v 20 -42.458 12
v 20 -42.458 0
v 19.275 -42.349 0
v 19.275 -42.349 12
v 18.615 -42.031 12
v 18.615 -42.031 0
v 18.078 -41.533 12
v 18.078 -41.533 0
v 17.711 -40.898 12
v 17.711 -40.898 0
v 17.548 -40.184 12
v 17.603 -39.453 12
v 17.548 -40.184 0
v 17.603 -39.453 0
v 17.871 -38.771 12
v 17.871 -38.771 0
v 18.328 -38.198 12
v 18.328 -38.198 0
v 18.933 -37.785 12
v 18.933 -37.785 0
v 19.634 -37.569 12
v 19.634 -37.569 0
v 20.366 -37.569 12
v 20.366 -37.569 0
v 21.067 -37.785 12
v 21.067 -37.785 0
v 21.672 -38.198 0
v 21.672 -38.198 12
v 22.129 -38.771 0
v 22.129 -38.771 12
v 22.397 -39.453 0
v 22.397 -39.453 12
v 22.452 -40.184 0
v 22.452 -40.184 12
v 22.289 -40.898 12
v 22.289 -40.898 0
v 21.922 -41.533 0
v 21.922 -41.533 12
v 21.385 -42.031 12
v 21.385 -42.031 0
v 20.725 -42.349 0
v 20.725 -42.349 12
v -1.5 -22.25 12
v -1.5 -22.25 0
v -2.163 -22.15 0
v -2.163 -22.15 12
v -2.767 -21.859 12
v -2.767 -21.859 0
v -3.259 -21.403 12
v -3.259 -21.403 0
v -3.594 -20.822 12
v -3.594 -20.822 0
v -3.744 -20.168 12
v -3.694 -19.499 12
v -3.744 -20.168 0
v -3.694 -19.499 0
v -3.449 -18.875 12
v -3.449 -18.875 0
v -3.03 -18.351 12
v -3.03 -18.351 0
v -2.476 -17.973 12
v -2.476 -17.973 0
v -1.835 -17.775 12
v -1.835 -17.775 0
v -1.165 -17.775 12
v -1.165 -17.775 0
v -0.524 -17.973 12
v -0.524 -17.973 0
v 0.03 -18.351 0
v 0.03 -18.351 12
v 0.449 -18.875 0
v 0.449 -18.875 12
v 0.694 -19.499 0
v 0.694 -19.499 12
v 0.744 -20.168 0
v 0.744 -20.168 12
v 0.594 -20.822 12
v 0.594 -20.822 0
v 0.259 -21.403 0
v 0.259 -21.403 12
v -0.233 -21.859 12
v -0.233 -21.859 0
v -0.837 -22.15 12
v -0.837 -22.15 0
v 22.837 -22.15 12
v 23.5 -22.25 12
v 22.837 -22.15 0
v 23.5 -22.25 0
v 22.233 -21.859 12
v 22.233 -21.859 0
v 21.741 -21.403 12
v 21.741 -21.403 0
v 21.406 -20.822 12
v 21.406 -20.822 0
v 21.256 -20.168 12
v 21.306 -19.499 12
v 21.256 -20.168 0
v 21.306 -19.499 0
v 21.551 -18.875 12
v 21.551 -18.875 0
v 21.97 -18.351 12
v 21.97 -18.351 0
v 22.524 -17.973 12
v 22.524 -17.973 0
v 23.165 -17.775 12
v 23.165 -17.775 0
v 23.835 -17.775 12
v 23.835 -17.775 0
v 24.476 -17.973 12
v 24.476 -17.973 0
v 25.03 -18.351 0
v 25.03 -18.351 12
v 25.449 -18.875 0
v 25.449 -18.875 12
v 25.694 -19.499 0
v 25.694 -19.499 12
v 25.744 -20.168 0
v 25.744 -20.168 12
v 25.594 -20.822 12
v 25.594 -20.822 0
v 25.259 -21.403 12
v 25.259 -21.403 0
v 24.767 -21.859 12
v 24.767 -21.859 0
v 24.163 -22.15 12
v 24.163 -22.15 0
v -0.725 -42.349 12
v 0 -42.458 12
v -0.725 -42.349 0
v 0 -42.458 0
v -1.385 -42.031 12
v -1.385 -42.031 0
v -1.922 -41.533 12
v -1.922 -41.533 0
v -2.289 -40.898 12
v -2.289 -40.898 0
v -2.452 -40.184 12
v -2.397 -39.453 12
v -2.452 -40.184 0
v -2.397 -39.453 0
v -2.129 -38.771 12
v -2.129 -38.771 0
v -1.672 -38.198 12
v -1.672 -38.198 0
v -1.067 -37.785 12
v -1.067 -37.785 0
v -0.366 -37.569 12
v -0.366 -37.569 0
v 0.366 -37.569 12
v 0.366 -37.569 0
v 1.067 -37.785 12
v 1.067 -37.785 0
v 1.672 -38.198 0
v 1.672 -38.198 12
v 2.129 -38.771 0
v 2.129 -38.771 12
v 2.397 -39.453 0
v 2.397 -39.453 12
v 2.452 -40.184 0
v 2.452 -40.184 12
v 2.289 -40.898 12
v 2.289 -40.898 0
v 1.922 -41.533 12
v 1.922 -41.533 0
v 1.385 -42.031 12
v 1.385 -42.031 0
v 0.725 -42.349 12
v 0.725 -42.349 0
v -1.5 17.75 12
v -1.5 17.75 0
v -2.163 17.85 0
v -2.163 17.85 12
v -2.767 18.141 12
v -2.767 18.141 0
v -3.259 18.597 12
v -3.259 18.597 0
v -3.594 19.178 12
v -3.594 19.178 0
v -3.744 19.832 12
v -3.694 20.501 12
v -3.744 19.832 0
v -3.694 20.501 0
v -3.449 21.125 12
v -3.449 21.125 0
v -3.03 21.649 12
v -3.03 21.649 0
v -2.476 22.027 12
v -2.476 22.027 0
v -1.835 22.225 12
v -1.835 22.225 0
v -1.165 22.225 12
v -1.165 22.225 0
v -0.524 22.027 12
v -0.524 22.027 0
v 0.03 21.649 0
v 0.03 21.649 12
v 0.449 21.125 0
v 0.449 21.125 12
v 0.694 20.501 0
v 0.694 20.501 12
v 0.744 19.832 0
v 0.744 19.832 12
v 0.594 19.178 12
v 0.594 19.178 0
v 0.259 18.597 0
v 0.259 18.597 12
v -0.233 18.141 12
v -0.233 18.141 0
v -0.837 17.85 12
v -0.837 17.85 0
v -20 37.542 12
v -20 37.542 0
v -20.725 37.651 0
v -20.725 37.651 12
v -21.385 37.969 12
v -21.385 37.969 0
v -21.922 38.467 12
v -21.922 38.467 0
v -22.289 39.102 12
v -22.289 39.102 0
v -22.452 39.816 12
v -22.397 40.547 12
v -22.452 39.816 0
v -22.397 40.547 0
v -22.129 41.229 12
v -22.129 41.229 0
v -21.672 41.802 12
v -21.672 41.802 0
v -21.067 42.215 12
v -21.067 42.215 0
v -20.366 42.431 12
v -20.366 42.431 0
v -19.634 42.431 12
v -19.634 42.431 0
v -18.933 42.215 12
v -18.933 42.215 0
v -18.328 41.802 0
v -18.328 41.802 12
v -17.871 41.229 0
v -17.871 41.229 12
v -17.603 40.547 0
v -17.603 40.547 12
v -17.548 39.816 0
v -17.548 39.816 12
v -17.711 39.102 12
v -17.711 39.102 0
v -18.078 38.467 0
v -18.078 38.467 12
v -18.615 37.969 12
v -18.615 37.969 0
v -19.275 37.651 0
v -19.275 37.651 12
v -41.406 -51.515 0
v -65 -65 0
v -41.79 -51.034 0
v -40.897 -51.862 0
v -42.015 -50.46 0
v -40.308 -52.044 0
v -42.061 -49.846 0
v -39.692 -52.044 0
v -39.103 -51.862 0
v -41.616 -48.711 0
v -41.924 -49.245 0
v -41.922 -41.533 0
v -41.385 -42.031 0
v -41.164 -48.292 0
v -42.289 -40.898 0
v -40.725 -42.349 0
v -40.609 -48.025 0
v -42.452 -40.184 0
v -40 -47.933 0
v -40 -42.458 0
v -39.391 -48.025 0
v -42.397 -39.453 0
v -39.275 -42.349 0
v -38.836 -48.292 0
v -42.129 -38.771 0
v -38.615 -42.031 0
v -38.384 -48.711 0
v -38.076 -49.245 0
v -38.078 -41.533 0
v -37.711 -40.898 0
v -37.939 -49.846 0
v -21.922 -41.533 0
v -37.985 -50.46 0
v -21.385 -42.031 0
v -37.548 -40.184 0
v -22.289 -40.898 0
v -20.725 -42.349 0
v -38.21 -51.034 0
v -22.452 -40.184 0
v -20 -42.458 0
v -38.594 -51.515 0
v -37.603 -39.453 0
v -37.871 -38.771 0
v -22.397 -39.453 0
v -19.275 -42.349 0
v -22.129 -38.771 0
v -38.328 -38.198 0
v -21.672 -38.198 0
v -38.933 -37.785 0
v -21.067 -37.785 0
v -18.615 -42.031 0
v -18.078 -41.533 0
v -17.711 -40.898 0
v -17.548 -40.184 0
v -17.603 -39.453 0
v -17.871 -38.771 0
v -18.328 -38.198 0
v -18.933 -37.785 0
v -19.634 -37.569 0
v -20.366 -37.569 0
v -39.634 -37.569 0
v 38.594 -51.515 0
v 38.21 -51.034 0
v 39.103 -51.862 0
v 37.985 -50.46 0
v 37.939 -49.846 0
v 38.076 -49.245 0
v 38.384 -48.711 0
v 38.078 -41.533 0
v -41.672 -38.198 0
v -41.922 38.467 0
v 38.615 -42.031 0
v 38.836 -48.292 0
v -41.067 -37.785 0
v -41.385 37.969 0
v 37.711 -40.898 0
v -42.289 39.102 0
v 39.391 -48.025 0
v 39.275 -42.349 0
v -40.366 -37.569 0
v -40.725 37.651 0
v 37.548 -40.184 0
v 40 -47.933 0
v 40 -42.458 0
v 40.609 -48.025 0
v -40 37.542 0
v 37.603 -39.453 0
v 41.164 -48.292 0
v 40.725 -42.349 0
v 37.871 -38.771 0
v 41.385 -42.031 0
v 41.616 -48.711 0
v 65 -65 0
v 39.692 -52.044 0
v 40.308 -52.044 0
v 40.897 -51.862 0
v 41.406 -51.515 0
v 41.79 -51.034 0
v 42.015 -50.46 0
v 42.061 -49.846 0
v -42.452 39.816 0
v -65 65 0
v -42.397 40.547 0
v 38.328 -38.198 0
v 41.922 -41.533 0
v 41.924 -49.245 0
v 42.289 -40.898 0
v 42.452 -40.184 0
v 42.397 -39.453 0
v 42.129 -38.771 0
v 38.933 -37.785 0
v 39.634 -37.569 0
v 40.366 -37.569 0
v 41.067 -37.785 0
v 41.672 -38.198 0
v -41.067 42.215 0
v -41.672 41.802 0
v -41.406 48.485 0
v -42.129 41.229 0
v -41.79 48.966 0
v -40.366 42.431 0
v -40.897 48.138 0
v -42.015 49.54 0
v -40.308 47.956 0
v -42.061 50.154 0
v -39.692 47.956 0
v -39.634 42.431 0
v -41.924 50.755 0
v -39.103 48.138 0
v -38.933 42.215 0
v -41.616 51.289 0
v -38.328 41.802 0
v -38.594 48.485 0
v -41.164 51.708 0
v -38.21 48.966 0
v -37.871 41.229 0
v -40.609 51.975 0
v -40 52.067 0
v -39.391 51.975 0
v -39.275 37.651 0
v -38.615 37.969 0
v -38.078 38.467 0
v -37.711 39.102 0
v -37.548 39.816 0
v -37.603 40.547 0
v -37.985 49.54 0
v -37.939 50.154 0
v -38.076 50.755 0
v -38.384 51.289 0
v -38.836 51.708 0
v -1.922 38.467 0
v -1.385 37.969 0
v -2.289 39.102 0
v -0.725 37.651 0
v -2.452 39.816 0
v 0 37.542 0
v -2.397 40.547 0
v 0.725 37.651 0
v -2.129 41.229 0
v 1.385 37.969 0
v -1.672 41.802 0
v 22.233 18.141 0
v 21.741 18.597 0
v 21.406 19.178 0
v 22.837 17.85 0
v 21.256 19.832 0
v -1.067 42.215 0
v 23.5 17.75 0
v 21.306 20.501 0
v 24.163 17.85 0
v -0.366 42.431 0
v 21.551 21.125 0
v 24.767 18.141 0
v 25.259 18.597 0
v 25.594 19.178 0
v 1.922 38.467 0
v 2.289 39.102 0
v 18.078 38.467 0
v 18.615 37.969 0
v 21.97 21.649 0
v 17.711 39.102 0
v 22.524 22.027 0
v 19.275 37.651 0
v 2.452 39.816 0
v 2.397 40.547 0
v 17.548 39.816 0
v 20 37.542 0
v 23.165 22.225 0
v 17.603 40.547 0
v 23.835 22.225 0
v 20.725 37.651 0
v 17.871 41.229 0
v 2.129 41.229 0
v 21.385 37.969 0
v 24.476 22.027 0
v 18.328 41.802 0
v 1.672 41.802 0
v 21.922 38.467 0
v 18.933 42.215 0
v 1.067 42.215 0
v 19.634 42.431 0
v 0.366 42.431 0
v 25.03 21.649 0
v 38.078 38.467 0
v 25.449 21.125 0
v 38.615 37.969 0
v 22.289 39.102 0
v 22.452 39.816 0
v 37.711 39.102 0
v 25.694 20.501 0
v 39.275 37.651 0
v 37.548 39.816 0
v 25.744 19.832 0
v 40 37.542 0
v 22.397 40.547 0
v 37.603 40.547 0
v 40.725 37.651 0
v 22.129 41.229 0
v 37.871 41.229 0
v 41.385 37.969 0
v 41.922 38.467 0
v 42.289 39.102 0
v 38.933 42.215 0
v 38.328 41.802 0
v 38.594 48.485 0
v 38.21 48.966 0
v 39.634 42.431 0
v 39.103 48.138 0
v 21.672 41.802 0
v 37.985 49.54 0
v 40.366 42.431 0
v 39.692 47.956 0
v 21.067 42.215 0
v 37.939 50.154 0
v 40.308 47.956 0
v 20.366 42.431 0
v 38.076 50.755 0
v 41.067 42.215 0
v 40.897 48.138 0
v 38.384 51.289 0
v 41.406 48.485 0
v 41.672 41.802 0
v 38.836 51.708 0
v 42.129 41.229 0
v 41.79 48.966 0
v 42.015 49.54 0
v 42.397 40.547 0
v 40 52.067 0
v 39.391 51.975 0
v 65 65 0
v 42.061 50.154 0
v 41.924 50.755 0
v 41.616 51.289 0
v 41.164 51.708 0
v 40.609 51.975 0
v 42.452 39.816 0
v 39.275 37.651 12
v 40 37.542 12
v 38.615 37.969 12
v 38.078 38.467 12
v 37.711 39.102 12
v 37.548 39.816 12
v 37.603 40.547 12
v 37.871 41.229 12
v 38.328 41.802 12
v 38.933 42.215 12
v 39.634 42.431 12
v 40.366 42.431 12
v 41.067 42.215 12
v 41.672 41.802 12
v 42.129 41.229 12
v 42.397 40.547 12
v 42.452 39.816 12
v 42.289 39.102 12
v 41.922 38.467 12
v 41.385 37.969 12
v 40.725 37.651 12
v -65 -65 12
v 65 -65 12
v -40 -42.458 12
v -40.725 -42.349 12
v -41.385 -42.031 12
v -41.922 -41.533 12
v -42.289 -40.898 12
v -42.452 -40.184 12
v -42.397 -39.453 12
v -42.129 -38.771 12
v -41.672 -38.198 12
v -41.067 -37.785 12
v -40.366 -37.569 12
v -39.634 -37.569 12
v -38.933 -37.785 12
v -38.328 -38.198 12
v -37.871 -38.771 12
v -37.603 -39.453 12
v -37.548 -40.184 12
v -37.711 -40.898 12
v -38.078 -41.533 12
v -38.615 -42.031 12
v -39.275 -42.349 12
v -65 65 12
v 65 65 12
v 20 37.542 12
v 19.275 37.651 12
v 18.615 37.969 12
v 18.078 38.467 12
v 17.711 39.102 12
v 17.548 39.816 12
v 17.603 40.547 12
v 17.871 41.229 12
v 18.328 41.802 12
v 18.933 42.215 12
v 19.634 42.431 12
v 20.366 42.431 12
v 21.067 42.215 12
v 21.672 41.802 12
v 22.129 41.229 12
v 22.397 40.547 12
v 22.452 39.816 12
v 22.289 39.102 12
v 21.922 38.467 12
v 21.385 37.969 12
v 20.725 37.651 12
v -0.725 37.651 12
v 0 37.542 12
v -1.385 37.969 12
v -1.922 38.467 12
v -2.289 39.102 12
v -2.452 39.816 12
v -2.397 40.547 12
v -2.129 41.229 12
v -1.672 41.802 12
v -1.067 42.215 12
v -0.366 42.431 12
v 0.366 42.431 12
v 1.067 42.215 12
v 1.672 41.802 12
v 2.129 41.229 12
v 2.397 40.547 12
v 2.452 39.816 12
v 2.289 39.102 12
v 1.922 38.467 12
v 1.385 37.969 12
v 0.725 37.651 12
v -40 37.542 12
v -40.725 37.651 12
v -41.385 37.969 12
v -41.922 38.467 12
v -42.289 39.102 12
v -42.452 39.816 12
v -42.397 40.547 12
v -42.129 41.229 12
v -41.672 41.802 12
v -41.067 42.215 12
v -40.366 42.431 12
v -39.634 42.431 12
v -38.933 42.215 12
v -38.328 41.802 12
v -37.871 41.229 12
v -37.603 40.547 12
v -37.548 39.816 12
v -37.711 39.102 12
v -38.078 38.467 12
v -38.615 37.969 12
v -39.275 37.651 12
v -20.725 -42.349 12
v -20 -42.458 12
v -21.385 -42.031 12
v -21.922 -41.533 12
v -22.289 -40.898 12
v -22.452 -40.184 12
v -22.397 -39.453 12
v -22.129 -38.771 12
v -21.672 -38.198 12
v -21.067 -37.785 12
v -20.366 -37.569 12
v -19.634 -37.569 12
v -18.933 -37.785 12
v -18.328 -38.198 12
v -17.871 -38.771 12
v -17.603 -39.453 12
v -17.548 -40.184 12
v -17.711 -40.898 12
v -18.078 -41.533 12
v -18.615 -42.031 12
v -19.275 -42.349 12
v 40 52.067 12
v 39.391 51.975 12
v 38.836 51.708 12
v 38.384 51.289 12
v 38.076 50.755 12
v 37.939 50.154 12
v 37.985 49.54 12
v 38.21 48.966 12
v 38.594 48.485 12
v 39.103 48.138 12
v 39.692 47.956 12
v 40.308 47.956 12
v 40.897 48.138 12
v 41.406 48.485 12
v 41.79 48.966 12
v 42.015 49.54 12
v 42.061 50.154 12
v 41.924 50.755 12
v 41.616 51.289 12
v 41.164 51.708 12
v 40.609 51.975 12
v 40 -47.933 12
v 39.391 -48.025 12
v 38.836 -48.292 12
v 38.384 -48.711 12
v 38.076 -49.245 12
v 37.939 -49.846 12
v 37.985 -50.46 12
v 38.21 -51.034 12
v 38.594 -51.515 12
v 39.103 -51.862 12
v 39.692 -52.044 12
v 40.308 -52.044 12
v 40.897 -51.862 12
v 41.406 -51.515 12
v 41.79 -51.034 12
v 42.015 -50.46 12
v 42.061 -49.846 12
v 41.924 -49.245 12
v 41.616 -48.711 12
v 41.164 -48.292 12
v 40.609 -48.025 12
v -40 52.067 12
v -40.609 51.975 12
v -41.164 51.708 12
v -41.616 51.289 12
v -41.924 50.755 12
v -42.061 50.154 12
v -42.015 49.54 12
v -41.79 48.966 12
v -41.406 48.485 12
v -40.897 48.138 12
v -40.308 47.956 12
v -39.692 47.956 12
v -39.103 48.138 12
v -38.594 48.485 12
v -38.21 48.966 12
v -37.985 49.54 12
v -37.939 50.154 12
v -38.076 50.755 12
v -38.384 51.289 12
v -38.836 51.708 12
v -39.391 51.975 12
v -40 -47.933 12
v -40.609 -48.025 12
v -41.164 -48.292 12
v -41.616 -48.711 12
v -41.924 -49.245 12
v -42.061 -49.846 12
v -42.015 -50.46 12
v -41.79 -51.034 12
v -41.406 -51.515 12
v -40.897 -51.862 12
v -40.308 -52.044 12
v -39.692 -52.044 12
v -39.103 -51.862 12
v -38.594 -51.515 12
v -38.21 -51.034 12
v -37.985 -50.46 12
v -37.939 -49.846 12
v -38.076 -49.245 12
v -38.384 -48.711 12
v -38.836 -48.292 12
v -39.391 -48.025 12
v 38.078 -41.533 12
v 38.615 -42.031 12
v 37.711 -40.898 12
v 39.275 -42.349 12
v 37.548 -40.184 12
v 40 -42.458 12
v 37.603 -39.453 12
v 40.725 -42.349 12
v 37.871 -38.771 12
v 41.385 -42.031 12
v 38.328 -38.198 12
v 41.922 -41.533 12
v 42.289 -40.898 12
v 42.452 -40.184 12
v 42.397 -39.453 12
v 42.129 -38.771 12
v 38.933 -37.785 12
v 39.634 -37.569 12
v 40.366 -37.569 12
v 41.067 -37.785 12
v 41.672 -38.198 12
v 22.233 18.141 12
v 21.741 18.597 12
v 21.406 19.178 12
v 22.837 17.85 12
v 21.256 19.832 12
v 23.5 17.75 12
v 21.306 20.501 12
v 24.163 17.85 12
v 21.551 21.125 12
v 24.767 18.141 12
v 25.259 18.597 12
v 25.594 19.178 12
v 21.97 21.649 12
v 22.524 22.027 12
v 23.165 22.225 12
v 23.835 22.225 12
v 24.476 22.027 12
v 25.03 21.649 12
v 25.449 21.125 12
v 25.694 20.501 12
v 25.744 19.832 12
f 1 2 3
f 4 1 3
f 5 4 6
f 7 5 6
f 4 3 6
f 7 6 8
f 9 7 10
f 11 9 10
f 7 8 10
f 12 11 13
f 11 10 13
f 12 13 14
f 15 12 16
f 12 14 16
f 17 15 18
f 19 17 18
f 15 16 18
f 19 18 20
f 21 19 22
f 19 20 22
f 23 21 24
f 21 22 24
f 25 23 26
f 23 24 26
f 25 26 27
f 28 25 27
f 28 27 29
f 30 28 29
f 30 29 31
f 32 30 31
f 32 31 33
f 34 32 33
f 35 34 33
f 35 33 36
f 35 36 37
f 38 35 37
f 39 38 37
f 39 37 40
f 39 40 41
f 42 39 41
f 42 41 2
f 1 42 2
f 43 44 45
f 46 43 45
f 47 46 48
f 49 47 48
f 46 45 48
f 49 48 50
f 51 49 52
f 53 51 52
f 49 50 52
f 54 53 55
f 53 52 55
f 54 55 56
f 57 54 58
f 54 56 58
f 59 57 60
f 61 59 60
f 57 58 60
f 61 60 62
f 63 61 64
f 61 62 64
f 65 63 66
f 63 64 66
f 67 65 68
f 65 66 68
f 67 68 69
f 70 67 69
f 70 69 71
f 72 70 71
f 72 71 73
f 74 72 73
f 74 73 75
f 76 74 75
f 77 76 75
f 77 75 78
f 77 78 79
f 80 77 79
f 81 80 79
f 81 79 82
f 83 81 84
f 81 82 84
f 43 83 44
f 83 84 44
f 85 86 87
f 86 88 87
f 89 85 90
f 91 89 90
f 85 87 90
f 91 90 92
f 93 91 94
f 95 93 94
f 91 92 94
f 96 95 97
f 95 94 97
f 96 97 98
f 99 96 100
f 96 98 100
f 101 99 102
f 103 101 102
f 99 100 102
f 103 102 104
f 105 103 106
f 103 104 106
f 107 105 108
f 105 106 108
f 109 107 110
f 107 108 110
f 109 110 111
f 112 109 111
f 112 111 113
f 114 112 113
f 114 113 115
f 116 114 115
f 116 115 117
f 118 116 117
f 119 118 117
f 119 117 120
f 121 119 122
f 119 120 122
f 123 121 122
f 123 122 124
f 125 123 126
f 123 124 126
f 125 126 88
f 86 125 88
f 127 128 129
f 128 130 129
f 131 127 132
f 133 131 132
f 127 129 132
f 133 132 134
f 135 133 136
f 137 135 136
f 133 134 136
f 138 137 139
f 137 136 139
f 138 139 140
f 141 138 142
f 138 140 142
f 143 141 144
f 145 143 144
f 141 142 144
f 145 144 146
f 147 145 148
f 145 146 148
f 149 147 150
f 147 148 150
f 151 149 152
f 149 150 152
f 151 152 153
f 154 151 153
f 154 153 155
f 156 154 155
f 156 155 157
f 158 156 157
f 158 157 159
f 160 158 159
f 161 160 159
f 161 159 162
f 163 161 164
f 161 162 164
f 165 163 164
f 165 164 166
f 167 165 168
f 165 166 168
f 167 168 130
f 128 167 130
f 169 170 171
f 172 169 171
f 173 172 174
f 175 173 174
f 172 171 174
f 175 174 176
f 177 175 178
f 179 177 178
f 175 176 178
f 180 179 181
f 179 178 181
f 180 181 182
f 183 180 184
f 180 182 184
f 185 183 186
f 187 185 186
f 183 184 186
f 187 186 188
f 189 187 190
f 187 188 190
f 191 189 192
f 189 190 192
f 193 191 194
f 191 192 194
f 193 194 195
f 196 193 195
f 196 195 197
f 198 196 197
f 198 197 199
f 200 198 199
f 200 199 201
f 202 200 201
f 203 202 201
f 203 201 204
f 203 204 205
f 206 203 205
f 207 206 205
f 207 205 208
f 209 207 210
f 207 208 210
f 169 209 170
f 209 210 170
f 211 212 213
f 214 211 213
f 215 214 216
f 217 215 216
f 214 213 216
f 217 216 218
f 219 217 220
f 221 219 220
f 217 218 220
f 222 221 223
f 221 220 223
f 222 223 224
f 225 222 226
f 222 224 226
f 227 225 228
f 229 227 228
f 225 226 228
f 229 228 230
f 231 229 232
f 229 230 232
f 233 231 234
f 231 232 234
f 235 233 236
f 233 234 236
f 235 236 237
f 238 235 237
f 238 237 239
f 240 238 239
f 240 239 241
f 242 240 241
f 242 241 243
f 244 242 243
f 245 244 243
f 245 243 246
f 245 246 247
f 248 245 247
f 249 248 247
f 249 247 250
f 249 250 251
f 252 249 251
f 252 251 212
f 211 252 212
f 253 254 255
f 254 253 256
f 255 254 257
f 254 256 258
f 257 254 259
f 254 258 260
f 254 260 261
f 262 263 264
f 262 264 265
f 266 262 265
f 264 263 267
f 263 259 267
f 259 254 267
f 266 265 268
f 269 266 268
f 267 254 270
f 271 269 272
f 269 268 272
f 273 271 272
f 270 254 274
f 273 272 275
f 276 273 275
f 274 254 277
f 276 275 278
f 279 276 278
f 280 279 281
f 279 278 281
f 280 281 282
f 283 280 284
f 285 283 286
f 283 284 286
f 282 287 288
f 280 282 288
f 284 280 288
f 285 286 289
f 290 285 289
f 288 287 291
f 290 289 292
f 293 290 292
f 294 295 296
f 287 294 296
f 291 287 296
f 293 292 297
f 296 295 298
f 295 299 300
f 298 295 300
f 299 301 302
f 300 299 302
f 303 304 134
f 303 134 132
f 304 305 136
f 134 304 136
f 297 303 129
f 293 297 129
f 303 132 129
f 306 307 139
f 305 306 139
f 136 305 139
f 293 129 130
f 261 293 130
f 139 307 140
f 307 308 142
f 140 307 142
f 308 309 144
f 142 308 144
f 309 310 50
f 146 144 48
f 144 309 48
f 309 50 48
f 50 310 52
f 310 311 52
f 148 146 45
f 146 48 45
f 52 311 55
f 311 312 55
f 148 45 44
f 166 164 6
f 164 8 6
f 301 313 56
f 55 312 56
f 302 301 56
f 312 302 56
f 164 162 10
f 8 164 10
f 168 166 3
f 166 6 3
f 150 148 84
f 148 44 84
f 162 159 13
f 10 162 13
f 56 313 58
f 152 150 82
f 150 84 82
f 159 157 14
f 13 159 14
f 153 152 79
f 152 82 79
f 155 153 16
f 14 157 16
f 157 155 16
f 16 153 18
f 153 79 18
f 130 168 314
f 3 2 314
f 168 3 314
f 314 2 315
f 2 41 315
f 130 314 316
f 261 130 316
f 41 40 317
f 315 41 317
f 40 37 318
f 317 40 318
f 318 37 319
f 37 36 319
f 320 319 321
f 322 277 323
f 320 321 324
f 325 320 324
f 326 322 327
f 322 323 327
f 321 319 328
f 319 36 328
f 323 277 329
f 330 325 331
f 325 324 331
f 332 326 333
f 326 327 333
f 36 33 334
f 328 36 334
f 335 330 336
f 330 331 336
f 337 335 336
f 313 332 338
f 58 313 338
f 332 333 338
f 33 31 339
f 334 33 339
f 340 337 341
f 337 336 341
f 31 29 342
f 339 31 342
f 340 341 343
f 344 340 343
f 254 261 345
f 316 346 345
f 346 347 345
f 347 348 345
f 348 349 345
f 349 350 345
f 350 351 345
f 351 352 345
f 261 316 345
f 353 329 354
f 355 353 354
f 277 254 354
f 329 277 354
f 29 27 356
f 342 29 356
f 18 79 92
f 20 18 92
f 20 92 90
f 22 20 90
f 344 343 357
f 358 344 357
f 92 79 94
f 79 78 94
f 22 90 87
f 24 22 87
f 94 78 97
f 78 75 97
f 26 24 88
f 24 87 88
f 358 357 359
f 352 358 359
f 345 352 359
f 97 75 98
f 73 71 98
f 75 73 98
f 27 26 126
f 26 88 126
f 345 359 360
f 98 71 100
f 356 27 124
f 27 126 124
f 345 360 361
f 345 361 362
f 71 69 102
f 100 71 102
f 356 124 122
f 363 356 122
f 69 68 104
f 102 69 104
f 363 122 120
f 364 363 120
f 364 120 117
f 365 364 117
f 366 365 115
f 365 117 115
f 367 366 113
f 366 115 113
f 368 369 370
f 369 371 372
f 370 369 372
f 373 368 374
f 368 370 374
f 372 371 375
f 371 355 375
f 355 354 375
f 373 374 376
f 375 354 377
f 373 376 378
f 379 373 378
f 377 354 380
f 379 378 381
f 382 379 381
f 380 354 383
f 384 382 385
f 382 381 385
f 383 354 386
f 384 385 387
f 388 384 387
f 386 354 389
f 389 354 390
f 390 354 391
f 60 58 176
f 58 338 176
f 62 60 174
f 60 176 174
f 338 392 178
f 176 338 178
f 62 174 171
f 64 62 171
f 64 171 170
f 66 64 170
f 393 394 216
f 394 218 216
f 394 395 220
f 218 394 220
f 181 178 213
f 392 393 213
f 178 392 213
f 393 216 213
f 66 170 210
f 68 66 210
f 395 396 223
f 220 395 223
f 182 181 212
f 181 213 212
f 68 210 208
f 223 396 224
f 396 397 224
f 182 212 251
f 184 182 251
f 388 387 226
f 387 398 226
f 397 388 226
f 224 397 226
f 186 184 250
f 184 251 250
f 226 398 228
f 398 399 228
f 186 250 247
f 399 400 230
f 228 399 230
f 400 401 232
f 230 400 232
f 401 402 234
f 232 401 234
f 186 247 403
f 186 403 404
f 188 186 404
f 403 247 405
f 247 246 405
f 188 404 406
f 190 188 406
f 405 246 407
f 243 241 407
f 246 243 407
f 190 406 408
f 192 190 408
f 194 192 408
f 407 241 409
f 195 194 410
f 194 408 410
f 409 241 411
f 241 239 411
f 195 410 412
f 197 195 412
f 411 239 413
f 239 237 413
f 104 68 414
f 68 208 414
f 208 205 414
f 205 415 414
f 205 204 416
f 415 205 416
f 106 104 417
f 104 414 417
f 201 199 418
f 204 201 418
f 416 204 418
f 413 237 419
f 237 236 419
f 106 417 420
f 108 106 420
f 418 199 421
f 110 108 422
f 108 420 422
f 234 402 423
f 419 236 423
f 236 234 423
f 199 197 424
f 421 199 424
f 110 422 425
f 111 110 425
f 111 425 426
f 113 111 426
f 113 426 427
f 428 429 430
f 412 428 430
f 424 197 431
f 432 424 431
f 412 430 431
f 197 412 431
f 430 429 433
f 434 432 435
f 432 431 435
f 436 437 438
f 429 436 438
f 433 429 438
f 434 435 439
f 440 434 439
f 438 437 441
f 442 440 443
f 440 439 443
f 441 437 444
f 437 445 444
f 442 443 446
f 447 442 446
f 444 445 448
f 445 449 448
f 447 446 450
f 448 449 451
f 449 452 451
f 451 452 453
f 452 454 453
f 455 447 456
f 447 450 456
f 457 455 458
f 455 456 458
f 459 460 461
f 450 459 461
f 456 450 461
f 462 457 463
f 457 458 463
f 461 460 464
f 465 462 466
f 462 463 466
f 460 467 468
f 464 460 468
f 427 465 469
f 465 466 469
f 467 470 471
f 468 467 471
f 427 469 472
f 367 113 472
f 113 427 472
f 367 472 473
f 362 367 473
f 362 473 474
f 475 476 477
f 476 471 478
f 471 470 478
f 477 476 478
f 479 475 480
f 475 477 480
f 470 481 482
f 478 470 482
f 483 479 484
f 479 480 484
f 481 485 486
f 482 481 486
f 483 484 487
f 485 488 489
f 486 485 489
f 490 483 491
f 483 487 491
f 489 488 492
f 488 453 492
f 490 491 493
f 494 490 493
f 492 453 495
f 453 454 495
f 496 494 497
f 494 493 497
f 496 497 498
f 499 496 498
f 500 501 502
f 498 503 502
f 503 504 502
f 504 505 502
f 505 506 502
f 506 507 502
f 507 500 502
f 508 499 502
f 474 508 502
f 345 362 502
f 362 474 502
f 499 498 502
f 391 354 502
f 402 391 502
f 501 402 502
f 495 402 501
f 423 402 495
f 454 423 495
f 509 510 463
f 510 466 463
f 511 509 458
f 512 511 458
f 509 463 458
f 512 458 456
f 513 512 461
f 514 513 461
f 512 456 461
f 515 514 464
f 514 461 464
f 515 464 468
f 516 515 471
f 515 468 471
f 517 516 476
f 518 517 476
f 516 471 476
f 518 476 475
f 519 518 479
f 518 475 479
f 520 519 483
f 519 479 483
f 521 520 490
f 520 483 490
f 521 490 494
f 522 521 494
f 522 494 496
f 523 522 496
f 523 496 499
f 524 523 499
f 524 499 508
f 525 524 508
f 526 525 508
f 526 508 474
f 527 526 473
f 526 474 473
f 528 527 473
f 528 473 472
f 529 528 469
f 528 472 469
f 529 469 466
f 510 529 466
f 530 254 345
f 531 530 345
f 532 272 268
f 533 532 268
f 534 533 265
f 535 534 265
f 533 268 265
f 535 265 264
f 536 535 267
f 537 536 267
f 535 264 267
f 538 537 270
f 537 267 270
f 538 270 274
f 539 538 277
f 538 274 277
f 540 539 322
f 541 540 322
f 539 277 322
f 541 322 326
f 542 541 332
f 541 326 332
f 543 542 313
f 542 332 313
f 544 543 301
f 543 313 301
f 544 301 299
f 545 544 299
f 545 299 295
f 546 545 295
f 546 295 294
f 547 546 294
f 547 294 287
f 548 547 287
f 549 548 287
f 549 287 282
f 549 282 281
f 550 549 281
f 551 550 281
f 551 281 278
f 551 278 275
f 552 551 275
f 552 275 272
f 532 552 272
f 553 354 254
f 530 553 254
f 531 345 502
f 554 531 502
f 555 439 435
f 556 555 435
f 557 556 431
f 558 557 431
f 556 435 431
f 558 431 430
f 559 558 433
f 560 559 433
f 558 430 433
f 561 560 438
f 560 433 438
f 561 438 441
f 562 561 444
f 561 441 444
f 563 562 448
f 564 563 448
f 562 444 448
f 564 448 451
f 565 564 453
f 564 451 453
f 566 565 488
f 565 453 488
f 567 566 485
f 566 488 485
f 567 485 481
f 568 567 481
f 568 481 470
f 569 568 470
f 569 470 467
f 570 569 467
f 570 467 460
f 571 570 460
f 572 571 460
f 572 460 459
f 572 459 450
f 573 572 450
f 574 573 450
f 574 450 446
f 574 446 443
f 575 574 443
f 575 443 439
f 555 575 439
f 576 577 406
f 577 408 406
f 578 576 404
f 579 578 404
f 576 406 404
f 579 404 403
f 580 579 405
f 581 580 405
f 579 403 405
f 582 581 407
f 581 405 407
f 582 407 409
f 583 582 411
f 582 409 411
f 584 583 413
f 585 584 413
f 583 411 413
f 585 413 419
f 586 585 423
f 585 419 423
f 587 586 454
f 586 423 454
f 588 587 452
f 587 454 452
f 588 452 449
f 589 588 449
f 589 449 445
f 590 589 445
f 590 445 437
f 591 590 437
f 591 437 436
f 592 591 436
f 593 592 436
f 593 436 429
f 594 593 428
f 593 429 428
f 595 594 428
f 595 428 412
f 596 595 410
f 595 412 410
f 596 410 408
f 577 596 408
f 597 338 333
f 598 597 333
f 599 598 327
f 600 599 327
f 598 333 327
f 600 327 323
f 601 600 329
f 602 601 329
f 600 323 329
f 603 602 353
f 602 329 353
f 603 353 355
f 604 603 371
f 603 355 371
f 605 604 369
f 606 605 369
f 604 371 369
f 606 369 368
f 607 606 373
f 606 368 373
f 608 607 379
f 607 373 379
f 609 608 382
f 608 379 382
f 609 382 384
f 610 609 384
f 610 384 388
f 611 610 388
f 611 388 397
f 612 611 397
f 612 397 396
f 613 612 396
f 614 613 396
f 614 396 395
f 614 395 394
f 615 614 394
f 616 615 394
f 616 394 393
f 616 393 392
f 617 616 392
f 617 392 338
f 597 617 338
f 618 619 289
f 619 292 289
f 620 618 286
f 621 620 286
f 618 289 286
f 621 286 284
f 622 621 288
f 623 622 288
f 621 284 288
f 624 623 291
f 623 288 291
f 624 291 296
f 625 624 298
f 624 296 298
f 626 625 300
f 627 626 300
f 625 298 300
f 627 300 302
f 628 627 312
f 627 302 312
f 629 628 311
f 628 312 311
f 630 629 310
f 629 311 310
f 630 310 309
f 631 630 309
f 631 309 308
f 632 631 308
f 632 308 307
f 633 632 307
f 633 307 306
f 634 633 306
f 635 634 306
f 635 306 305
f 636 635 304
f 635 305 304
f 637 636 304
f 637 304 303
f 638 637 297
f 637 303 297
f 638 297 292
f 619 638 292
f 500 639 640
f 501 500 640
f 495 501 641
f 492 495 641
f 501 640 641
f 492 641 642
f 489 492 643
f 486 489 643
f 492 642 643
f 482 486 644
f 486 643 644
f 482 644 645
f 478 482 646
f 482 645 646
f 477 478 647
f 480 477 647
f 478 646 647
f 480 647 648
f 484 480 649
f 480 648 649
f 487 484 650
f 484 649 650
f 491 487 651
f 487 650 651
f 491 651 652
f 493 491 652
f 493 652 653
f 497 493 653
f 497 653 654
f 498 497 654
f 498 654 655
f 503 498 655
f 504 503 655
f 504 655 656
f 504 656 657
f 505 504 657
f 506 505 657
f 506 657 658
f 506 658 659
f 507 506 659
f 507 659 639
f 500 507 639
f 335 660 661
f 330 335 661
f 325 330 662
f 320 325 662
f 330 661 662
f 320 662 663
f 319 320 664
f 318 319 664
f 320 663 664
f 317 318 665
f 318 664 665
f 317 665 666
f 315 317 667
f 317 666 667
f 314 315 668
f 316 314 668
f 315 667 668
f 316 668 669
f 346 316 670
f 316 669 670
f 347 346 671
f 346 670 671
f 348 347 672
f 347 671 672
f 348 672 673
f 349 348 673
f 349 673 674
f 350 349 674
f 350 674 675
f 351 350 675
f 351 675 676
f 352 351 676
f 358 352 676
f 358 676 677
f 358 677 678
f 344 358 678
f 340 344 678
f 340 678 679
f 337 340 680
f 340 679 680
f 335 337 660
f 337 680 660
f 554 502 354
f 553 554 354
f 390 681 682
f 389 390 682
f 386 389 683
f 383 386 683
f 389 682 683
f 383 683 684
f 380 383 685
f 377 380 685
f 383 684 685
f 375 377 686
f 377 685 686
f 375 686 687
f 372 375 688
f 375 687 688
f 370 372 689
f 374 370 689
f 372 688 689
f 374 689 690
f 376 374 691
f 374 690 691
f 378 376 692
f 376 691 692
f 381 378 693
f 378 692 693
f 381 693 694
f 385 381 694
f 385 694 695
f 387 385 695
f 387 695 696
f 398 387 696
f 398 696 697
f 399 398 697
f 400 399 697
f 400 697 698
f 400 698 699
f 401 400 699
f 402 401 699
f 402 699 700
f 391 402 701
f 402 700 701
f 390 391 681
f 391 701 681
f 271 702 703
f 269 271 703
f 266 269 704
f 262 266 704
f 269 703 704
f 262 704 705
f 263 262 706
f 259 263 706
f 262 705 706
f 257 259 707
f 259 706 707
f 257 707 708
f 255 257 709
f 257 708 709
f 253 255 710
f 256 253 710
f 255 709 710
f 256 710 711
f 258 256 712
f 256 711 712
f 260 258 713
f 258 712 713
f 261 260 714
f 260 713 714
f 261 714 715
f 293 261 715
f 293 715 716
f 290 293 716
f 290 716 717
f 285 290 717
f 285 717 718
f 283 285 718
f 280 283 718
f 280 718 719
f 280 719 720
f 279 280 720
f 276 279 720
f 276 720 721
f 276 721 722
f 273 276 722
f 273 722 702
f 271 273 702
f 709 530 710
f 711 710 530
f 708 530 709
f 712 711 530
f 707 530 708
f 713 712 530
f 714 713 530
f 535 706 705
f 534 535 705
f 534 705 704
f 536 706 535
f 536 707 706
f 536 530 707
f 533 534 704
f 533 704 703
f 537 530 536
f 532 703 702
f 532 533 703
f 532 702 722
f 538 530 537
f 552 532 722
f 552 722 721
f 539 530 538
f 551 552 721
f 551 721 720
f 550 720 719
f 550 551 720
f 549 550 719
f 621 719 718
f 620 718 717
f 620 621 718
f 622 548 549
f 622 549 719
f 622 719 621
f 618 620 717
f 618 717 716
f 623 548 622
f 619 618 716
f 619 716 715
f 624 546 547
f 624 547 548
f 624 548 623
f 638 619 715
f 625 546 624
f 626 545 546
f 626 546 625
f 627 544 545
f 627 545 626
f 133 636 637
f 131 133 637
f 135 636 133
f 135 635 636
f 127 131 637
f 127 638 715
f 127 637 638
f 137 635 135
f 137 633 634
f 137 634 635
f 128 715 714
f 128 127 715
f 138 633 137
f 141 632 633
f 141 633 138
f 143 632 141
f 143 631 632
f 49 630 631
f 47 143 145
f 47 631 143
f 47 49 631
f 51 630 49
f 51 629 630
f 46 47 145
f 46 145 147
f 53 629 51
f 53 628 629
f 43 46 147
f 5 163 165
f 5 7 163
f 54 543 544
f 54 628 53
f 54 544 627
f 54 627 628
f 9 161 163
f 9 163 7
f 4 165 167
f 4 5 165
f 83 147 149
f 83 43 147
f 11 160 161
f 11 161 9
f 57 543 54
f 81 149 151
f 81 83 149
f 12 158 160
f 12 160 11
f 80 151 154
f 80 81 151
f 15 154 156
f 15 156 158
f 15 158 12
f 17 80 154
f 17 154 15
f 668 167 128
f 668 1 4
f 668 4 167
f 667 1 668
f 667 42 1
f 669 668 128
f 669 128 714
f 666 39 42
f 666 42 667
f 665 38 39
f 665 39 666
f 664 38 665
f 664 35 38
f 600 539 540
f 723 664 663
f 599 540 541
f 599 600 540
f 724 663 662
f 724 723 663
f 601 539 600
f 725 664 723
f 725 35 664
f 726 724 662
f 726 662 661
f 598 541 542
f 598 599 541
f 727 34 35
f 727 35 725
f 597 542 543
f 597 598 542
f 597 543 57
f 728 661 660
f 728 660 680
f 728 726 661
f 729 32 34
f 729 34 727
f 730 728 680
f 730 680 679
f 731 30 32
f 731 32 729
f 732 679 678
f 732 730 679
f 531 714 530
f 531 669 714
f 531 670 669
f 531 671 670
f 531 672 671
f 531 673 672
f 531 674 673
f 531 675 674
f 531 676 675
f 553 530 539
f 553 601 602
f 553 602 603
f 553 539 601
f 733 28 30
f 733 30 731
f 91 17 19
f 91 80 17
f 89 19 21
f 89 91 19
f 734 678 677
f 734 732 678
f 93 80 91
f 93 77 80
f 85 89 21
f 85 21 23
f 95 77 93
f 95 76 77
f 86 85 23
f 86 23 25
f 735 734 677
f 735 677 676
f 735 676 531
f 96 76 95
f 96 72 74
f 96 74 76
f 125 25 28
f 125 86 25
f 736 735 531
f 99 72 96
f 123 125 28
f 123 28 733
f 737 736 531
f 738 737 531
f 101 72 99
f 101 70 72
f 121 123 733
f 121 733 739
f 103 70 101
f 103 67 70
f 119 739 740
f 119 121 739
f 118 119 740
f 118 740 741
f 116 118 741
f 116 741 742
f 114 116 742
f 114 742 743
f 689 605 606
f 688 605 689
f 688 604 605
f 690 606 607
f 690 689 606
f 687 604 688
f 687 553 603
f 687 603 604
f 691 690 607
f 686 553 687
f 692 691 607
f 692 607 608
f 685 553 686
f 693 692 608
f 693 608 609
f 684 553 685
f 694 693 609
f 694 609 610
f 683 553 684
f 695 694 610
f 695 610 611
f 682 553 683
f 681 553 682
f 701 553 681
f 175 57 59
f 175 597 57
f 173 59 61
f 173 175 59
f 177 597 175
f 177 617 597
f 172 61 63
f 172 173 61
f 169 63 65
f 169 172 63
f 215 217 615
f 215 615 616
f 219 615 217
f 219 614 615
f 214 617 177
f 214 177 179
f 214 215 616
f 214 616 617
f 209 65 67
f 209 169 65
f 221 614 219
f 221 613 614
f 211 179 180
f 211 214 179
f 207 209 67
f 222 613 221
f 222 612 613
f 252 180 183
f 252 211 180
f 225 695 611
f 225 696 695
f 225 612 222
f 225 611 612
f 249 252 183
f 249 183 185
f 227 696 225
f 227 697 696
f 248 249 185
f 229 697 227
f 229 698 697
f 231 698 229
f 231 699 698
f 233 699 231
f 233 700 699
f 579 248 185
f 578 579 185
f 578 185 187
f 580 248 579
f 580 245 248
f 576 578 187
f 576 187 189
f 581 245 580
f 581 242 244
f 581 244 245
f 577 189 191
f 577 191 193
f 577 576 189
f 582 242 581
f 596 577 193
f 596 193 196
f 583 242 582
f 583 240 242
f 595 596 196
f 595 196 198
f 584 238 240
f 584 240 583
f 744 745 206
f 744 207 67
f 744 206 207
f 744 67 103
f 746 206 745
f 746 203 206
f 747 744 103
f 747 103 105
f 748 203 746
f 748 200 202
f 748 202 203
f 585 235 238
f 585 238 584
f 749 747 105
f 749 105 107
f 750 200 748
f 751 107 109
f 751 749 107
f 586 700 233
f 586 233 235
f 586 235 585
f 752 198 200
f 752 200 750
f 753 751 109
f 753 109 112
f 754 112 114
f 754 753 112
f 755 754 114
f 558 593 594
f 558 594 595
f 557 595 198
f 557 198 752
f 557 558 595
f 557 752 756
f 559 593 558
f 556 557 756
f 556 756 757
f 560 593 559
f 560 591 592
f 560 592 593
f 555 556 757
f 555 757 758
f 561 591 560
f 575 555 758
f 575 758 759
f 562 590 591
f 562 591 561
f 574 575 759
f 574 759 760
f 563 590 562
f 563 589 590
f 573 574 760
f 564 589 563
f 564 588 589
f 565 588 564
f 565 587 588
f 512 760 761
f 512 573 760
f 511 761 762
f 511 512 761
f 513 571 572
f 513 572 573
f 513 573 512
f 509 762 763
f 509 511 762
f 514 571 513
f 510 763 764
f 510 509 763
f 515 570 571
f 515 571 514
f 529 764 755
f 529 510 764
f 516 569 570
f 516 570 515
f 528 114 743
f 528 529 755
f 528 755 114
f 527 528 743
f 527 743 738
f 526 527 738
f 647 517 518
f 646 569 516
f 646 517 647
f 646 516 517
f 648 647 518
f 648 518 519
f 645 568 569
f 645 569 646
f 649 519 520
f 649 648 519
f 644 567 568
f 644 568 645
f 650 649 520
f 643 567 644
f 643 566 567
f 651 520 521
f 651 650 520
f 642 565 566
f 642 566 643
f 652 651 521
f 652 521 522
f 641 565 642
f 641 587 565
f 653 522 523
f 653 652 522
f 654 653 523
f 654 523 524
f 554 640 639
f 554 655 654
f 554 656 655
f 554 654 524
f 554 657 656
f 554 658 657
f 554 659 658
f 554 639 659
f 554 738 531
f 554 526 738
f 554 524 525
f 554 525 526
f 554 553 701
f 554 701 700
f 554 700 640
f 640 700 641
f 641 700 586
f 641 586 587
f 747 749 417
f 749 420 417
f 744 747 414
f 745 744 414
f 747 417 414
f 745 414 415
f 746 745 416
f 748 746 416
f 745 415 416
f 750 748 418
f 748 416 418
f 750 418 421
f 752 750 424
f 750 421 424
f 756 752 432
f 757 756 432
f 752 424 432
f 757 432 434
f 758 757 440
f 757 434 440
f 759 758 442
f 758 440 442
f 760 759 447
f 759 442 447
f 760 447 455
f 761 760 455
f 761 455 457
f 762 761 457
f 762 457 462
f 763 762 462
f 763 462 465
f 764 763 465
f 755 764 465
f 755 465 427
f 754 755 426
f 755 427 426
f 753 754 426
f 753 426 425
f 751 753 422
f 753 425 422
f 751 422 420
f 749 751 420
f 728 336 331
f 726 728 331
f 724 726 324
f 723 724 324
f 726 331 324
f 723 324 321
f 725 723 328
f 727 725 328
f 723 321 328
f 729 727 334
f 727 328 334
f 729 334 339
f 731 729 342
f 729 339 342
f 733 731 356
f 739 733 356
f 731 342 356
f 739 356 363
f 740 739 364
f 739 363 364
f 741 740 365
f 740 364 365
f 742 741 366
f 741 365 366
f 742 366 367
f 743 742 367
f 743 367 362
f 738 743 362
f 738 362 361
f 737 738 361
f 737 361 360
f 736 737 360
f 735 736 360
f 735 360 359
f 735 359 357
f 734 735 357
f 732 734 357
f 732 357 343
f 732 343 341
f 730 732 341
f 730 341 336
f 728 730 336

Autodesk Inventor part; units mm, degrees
ref_plane "YZ Plane" through (0, 0, 0) normal (1, 0, 0) x (0, 1, 0)
ref_plane "XZ Plane" through (0, 0, 0) normal (0, 1, 0) x (-1, 0, 0)
ref_plane "XY Plane" through (0, 0, 0) normal (0, 0, 1) x (1, 0, 0)
sketch "Sketch1" plane through (0, 0, 0) normal (0, 0, 1) x (1, 0, 0)
  line L0 (-65, -65) -> (65, -65)
  line L1 (65, -65) -> (65, 65)
  line L2 (65, 65) -> (-65, 65)
  line L3 (-65, 65) -> (-65, -65)
  line L4 (-65, -65) -> (65, 65) construction
  line L5 (65, -65) -> (-65, 65) construction
  point P0 (0, 0)
  dimension "d0" = 130
  dimension "d1" = 130
extrude "Extrusion1" add sketch "Sketch1" along normal blind 12
sketch "Sketch2" plane through (0, 0, 12) normal (0, 0, 1) x (1, 0, 0)
  line L0 (-65, -65) -> (65, -65) projected
  line L1 (65, -65) -> (65, 65) projected
  line L2 (65, 65) -> (-65, 65) projected
  point P0 (0, 0)
  point P1 (40, -40)
  point P2 (40, 40)
  point P3 (0, 40)
  point P4 (-40, 40)
  point P5 (-40, -40)
  point P6 (0, -40)
  dimension "d4" = 40
  dimension "d5" = 40
  dimension "d7" = 25
  dimension "d8" = 25
  dimension "d9" = 25
hole "Hole1" at (40, -40, 12) at (40, 40, 12) at (0, 40, 12) at (-40, 40, 12) at (-40, -40, 12) at (0, -40, 12) direction (0, 0, -1) diameter 4.917 end through all thread size "M6x1" designation "M6" class "6H" standard "ISO Metric profile"
sketch "Sketch3" plane through (0, 0, 12) normal (0, 0, 1) x (1, 0, 0)
  line L0 (-1.5, 20) -> (23.5, 20)
  line L1 (23.5, 20) -> (23.5, -20)
  line L2 (23.5, -20) -> (-1.5, -20)
  line L3 (-1.5, -20) -> (-1.5, 20)
  line L4 (65, -65) -> (65, 65) projected
  point P0 (0, 0)
  point P1 (-1.5, 0)
  dimension "d17" = 40
  dimension "d18" = 25
  dimension "d19" = 41.5
hole "Hole2" at (23.5, 20, 12) at (-1.5, 20, 12) at (-1.5, -20, 12) at (23.5, -20, 12) direction (0, 0, -1) diameter 4.5 end through all clearance for "Socket Head Cap Screw ISO 4762" size "M4" standard "ISO"
sketch "Sketch4" plane through (0, 0, 12) normal (0, 0, 1) x (1, 0, 0)
  line L0 (-20, 40) -> (20, 40)
  line L1 (20, 40) -> (20, -40)
  line L2 (20, -40) -> (-20, -40)
  line L3 (-20, -40) -> (-20, 40)
  circle A0 centre (40, -40) radius 2.4585 projected
  circle A1 centre (0, -40) radius 2.4585 projected
  circle A2 centre (0, 40) radius 2.4585 projected
  point P0 (0, 0)
  dimension "d27" = 40
  dimension "d28" = 20
hole "Hole3" at (20, -40, 12) at (-20, -40, 12) at (-20, 40, 12) at (20, 40, 12) direction (0, 0, -1) diameter 4.917 end through all thread size "M6x1" designation "M6" class "6H" standard "ISO Metric profile"
sketch "Sketch5" plane through (0, 0, 0) normal (0, 0, -1) x (-1, 0, 0)
  line L0 (40, -50) -> (-40, -50)
  line L1 (-40, -50) -> (-40, 50)
  line L2 (-40, 50) -> (40, 50)
  line L3 (40, 50) -> (40, -50)
  line L4 (-65, -65) -> (-65, 65) projected
  line L5 (-65, 65) -> (65, 65) projected
  line L6 (65, -65) -> (-65, -65) projected
  line L7 (65, 65) -> (65, -65) projected
  point P0 (0, 0)
  dimension "d36" = 25
  dimension "d38" = 15
  dimension "d39" = 15
  dimension "d40" = 25
hole "Hole4" at (-40, -50, 0) at (40, -50, 0) at (40, 50, 0) at (-40, 50, 0) direction (0, 0, 1) diameter 4.134 end through all thread size "M5x0.8" designation "M5" class "6H" standard "ISO Metric profile"
equation "\"d9\" = d7"
equation "\"d28\" = 0.5 * d27"
equation "\"d39\" = d38"
equation "\"d40\" = d36"
properties part number "Befestigungsplatte" material "Aluminum 6061"
